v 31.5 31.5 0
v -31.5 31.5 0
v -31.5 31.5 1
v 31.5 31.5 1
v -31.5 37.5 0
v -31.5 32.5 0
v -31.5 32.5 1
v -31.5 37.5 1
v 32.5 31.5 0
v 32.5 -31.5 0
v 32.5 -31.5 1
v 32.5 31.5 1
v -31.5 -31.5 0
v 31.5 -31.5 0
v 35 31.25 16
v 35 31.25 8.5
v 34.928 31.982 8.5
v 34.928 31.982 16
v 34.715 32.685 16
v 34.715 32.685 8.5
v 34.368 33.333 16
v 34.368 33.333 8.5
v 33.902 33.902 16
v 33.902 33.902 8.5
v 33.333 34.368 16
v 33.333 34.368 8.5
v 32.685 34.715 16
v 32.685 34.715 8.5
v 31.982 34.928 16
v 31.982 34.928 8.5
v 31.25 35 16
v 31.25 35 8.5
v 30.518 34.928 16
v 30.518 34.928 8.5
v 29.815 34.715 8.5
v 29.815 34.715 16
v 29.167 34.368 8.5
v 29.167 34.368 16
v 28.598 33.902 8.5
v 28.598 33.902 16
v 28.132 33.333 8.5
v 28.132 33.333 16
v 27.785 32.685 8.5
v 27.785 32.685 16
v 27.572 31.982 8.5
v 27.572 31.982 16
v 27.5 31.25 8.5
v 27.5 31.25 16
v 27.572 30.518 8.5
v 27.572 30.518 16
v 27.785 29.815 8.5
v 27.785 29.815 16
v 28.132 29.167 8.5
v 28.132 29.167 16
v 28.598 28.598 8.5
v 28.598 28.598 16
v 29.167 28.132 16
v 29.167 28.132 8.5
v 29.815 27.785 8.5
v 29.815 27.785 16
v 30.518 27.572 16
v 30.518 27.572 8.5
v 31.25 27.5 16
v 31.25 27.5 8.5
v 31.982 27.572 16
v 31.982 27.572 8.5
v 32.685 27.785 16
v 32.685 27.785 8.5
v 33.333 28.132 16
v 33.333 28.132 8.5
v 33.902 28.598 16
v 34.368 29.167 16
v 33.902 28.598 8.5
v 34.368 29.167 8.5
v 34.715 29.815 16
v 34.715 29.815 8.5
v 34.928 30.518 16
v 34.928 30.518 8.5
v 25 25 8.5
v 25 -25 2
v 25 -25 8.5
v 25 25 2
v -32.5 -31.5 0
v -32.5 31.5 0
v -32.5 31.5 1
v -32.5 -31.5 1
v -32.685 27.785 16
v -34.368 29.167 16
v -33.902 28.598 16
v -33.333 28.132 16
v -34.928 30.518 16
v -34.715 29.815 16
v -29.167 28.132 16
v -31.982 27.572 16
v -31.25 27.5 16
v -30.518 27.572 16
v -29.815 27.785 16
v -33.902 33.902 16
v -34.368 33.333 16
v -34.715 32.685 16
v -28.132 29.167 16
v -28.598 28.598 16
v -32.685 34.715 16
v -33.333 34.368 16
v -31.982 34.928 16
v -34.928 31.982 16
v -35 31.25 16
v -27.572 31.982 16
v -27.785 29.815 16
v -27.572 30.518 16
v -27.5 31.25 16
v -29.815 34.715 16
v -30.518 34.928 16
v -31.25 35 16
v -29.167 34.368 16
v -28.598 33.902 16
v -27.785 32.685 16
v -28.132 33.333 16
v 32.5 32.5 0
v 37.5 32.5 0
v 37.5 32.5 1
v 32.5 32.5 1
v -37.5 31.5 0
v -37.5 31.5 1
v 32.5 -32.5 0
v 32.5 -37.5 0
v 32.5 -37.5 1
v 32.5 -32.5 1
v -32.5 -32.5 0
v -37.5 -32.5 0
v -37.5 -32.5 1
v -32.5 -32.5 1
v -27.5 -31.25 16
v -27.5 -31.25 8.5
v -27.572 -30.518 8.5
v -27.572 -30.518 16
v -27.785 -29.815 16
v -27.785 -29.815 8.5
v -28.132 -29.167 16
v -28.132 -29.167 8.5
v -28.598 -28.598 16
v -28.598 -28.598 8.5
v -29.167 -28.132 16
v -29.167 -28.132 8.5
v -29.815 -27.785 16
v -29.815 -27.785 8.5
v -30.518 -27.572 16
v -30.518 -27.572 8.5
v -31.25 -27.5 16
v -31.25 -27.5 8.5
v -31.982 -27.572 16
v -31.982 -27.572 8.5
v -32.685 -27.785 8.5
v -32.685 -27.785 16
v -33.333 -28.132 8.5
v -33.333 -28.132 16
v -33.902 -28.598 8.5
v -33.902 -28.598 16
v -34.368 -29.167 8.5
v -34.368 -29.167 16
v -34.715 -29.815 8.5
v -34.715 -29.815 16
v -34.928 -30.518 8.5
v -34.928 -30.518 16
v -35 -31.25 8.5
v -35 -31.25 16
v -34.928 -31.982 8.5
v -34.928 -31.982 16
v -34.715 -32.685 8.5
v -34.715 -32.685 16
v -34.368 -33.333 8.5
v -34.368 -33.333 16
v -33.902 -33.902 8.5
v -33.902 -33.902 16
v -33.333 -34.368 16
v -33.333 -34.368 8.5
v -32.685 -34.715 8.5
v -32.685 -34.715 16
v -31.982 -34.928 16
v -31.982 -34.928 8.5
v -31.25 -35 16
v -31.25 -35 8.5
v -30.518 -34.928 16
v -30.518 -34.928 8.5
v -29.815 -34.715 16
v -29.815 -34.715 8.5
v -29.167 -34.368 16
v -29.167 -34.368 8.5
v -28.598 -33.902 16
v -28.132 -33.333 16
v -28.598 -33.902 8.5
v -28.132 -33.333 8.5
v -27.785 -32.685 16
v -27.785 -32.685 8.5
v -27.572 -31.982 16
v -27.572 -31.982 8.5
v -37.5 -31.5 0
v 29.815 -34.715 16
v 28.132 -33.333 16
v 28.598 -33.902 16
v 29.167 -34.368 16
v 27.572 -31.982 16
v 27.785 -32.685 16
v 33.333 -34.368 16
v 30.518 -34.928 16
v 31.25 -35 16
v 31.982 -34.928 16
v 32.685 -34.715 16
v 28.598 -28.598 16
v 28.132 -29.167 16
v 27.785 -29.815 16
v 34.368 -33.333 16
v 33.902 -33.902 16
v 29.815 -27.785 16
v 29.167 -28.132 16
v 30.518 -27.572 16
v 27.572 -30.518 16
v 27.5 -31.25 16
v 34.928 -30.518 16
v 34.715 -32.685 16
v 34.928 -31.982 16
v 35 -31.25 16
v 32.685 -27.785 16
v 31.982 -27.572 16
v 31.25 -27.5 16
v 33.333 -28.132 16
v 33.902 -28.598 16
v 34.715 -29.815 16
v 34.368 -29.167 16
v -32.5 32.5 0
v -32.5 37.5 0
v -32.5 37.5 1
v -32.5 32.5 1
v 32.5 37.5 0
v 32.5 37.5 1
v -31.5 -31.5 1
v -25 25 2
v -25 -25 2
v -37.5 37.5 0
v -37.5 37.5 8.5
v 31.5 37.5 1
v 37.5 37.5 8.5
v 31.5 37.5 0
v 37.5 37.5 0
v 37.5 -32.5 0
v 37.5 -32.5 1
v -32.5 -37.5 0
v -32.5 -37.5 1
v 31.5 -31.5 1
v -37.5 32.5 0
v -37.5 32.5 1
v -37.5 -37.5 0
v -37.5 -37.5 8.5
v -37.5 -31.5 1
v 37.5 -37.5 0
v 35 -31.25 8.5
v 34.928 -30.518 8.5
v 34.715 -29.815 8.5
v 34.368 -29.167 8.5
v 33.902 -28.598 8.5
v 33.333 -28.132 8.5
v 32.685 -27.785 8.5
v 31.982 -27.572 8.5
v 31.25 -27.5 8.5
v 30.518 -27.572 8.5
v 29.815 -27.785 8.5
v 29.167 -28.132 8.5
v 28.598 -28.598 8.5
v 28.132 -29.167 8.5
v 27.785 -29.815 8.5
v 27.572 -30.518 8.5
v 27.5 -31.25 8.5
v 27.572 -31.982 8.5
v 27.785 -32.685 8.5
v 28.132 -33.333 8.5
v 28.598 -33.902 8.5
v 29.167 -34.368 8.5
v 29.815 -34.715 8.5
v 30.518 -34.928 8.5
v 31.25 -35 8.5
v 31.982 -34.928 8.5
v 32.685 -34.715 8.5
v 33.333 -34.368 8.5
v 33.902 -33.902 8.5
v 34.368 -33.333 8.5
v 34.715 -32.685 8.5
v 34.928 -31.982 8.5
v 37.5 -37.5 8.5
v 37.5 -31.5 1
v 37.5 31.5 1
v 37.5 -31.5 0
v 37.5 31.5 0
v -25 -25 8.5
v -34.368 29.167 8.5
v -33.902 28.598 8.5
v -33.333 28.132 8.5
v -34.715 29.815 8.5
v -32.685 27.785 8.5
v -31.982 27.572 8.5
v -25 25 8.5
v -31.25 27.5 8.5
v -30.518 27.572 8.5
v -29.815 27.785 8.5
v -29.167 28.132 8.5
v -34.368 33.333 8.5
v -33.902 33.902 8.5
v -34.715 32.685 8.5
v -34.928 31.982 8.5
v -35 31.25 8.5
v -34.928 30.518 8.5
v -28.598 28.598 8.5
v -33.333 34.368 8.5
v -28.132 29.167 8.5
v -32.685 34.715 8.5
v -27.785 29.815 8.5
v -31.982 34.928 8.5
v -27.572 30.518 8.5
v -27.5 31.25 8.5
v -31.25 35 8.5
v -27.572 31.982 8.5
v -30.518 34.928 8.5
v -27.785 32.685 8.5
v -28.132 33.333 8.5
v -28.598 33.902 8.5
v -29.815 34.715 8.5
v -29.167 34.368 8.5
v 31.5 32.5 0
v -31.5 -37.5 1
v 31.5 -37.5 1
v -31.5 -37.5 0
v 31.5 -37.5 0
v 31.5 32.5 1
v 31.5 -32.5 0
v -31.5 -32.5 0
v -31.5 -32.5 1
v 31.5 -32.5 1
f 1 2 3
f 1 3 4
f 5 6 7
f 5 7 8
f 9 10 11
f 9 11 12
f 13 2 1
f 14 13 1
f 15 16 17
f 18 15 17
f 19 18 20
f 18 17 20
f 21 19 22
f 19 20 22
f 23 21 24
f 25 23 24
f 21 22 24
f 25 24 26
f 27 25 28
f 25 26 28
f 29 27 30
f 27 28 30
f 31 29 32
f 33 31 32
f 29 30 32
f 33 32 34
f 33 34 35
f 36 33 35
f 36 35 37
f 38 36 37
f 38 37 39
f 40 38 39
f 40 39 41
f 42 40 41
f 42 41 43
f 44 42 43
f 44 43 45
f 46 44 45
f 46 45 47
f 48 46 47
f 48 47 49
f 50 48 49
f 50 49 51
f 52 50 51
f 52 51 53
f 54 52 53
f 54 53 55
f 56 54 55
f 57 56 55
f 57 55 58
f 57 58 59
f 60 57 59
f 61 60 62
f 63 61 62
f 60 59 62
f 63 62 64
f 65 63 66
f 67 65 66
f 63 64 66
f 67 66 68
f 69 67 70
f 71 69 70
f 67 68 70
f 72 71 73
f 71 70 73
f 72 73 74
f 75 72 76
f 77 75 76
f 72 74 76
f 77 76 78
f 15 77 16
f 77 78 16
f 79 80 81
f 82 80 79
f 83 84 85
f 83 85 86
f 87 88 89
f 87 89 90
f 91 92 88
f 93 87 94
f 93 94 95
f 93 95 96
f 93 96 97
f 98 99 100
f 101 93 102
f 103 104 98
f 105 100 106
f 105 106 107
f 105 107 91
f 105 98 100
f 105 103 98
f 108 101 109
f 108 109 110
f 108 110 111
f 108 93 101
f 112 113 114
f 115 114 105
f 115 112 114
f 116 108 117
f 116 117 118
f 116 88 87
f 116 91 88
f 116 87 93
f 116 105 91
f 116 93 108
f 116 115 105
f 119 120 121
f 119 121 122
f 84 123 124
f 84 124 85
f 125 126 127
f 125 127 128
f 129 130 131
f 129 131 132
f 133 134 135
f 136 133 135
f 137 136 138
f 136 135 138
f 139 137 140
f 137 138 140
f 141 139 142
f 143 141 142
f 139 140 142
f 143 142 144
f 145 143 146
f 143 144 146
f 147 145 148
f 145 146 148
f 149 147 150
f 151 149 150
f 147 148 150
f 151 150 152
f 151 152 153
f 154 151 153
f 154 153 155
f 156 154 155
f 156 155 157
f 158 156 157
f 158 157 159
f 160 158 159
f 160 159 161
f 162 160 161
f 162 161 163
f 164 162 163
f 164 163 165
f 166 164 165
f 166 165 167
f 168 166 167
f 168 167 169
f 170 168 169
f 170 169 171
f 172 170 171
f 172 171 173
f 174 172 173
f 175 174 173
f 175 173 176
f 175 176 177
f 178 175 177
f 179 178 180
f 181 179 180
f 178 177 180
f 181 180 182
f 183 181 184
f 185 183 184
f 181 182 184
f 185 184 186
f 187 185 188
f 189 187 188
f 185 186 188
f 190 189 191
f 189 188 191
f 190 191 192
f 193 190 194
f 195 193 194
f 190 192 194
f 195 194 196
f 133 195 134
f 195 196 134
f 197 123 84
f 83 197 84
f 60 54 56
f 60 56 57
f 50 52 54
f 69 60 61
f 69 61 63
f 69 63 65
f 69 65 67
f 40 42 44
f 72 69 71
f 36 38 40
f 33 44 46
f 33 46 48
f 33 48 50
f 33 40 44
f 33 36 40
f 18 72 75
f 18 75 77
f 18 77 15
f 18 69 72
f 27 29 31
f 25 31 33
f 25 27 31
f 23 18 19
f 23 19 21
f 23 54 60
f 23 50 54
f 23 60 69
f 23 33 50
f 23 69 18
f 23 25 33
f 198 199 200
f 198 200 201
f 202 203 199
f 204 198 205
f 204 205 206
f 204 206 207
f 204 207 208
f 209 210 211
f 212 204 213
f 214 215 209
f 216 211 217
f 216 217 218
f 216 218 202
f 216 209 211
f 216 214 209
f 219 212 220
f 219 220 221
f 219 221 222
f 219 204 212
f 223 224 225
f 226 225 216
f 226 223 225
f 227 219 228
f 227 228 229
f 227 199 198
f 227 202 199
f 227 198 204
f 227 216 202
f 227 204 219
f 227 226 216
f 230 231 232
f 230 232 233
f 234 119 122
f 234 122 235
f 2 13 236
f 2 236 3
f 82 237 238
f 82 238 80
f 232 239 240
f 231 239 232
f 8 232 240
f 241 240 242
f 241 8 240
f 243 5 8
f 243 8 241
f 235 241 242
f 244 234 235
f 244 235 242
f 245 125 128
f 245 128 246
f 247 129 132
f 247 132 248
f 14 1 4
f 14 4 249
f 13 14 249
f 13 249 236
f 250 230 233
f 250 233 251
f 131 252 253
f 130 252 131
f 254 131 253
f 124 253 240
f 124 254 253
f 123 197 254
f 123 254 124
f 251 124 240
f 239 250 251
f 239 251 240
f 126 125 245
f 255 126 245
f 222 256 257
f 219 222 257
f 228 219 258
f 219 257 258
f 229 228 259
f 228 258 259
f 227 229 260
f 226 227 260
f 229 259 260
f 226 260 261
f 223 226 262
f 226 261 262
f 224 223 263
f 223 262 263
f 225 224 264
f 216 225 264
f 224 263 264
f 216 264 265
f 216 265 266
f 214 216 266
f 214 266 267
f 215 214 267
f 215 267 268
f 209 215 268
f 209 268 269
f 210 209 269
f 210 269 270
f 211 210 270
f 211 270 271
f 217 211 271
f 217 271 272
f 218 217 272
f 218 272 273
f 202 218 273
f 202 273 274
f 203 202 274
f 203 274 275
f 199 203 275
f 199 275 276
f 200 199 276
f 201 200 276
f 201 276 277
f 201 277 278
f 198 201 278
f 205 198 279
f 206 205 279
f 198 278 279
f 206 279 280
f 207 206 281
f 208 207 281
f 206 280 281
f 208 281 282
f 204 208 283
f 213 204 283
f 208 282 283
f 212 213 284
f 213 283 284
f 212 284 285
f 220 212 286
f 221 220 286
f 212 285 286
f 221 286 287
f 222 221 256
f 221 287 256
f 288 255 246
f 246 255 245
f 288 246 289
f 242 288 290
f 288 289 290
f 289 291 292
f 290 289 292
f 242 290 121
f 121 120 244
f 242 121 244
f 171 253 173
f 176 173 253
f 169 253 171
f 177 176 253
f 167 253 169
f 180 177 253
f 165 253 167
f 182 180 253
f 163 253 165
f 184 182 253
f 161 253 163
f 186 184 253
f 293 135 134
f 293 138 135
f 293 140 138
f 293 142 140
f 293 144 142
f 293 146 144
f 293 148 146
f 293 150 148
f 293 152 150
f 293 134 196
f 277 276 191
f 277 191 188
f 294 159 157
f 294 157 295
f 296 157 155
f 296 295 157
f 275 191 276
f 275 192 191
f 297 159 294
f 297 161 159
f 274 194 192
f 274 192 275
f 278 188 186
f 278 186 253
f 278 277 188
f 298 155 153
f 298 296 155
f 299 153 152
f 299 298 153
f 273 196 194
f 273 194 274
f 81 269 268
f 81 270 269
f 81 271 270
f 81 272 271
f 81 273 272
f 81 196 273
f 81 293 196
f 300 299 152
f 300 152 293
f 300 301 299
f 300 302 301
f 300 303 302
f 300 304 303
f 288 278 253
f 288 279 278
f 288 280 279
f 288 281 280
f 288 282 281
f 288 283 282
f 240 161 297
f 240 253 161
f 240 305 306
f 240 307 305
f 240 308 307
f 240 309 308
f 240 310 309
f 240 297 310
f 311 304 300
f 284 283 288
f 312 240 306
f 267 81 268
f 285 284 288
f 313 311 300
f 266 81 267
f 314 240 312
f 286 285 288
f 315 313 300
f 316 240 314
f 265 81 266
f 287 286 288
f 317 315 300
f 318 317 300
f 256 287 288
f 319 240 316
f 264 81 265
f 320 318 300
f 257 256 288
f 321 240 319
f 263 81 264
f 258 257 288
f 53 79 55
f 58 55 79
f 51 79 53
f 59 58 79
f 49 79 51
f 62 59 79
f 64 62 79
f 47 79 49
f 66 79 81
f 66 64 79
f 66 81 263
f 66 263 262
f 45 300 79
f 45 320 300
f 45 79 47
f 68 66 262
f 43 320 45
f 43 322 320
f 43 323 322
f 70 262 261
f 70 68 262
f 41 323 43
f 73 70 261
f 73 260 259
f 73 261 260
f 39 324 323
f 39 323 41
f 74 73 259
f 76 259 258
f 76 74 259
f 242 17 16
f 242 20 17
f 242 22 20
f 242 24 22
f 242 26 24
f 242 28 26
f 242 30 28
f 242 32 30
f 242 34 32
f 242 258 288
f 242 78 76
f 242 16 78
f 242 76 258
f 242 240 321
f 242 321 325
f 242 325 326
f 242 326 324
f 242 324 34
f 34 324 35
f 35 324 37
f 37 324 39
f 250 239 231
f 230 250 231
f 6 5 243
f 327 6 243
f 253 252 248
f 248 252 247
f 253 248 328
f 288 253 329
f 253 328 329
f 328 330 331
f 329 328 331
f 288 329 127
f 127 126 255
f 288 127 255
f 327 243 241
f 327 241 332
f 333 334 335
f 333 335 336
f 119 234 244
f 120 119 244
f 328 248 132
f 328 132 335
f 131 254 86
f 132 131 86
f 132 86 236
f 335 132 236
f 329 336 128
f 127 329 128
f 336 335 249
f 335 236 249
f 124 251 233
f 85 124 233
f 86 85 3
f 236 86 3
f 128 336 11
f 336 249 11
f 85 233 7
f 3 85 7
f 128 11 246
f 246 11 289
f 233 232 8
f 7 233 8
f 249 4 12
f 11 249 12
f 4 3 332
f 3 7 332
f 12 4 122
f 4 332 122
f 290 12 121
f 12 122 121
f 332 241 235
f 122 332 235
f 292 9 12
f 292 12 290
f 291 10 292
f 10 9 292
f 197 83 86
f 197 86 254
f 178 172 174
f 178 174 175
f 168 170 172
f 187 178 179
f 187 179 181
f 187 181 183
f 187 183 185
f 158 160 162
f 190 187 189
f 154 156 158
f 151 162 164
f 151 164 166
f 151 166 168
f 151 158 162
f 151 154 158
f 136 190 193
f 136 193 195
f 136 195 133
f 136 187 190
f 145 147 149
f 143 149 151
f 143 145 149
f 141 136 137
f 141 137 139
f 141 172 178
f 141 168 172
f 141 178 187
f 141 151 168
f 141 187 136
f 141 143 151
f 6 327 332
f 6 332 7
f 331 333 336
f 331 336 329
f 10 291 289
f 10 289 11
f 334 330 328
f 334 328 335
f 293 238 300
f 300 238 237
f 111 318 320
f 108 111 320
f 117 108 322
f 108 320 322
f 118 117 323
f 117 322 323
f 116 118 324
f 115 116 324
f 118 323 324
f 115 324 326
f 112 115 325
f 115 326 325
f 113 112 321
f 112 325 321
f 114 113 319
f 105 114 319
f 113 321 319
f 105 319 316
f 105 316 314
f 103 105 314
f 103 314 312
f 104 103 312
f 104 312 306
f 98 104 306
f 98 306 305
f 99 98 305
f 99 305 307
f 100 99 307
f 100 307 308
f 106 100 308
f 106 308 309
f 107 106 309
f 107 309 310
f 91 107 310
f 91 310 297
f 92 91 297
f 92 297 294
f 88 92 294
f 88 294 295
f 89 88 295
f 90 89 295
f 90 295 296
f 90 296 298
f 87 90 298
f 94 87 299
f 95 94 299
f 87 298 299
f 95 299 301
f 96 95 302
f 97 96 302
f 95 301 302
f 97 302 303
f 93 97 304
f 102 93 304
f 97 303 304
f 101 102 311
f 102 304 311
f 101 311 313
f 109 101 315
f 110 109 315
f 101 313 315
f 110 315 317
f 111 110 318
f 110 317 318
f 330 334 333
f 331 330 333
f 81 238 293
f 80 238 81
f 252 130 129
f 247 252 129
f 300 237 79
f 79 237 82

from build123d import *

# Parameters (mm, degrees)
F0_W     = 75
F0_H     = 75
F0_R     = 3.75
F1_DEPTH = 2
F2_DEPTH = 16
F3_W     = 75
F3_H     = 75
F3_R     = 3.75
F3_W_2   = 50
F3_H_2   = 50
F4_DEPTH = 6.5
F5_W     = 1
F5_H     = 1
F6_DEPTH = 1


with BuildPart() as f1:
    # F0 (on Top) → F1 (new body)
    with BuildSketch(Plane.XY):
        Rectangle(F0_W, F0_H)
        with Locations((-31.25, -31.25)):
            Circle(F0_R, mode=Mode.SUBTRACT)
        with Locations((31.25, -31.25)):
            Circle(F0_R, mode=Mode.SUBTRACT)
        with Locations((-31.25, 31.25)):
            Circle(F0_R, mode=Mode.SUBTRACT)
        with Locations((31.25, 31.25)):
            Circle(F0_R, mode=Mode.SUBTRACT)
        with Locations((-31.25, 31.25)):
            Circle(F0_R)
        with Locations((31.25, 31.25)):
            Circle(F0_R)
        with Locations((31.25, -31.25)):
            Circle(F0_R)
        with Locations((-31.25, -31.25)):
            Circle(F0_R)
    extrude(amount=F1_DEPTH)

    # F0 (on Top) → F2 (join)
    with BuildSketch(Plane.XY):
        with Locations((-31.25, -31.25)):
            Circle(F0_R)
        with Locations((31.25, -31.25)):
            Circle(F0_R)
        with Locations((-31.25, 31.25)):
            Circle(F0_R)
        with Locations((31.25, 31.25)):
            Circle(F0_R)
    extrude(amount=F2_DEPTH)

    # F3 (on face) → F4 (join)
    with BuildSketch(Plane.XY.offset(2)):
        Rectangle(F3_W, F3_H)
        with Locations((-31.25, -31.25)):
            Circle(F3_R, mode=Mode.SUBTRACT)
        with Locations((31.25, -31.25)):
            Circle(F3_R, mode=Mode.SUBTRACT)
        with Locations((-31.25, 31.25)):
            Circle(F3_R, mode=Mode.SUBTRACT)
        Rectangle(F3_W_2, F3_H_2, mode=Mode.SUBTRACT)
        with Locations((31.25, 31.25)):
            Circle(F3_R, mode=Mode.SUBTRACT)
    extrude(amount=F4_DEPTH)

    # F5 (on face) → F6 (cut)
    with BuildSketch(Plane.XY):
        with BuildLine():
            Line((-32.5, -34.7855339059), (-32.5, -37.5))
            Line((-32.5, -37.5), (-31.5, -37.5))
            Line((-31.5, -37.5), (-31.5, -34.9916573868))
            ThreePointArc((-31.5, -34.9916573868), (-32.0070480317, -34.9227888964), (-32.5, -34.7855339059))
        make_face()
        with BuildLine():
            Line((-32.5, -32.5), (-32.5, -34.7855339059))
            ThreePointArc((-32.5, -34.7855339059), (-32.0070480317, -34.9227888964), (-31.5, -34.9916573868))
            Line((-31.5, -34.9916573868), (-31.5, -32.5))
            Line((-31.5, -32.5), (-32.5, -32.5))
        make_face()
        with BuildLine():
            Line((31.5, -34.9916573868), (31.5, -37.5))
            Line((31.5, -37.5), (32.5, -37.5))
            Line((32.5, -37.5), (32.5, -34.7855339059))
            ThreePointArc((32.5, -34.7855339059), (32.0070480317, -34.9227888964), (31.5, -34.9916573868))
        make_face()
        with BuildLine():
            Line((-34.7855339059, -32.5), (-32.5, -32.5))
            Line((-32.5, -32.5), (-32.5, -31.5))
            Line((-32.5, -31.5), (-34.9916573868, -31.5))
            ThreePointArc((-34.9916573868, -31.5), (-34.9227888964, -32.0070480317), (-34.7855339059, -32.5))
        make_face()
        with Locations((-32, -32)):
            Rectangle(F5_W, F5_H)
        with BuildLine():
            Line((-37.5, -32.5), (-34.7855339059, -32.5))
            ThreePointArc((-34.7855339059, -32.5), (-34.9227888964, -32.0070480317), (-34.9916573868, -31.5))
            Line((-34.9916573868, -31.5), (-37.5, -31.5))
            Line((-37.5, -31.5), (-37.5, -32.5))
        make_face()
        with BuildLine():
            Line((-31.5, -31.5), (-31.5, -32.5))
            Line((-31.5, -32.5), (-27.7144660941, -32.5))
            ThreePointArc((-27.7144660941, -32.5), (-27.5772111036, -32.0070480317), (-27.5083426132, -31.5))
            Line((-27.5083426132, -31.5), (-31.5, -31.5))
        make_face()
        with BuildLine():
            ThreePointArc((-27.5083426132, -31.5), (-27.5772111036, -32.0070480317), (-27.7144660941, -32.5))
            Line((-27.7144660941, -32.5), (27.7144660941, -32.5))
            ThreePointArc((27.7144660941, -32.5), (27.5772111036, -32.0070480317), (27.5083426132, -31.5))
            Line((27.5083426132, -31.5), (-27.5083426132, -31.5))
        make_face()
        with BuildLine():
            Line((31.5, -32.5), (31.5, -34.9916573868))
            ThreePointArc((31.5, -34.9916573868), (32.0070480317, -34.9227888964), (32.5, -34.7855339059))
            Line((32.5, -34.7855339059), (32.5, -32.5))
            Line((32.5, -32.5), (31.5, -32.5))
        make_face()
        with BuildLine():
            Line((-32.5, -27.7144660941), (-32.5, -31.5))
            Line((-32.5, -31.5), (-31.5, -31.5))
            Line((-31.5, -31.5), (-31.5, -27.5083426132))
            ThreePointArc((-31.5, -27.5083426132), (-32.0070480317, -27.5772111036), (-32.5, -27.7144660941))
        make_face()
        with BuildLine():
            ThreePointArc((27.5083426132, -31.5), (27.5772111036, -32.0070480317), (27.7144660941, -32.5))
            Line((27.7144660941, -32.5), (31.5, -32.5))
            Line((31.5, -32.5), (31.5, -31.5))
            Line((31.5, -31.5), (27.5083426132, -31.5))
        make_face()
        with Locations((32, -32)):
            Rectangle(F5_W, F5_H)
        with BuildLine():
            Line((-32.5, 27.7144660941), (-32.5, -27.7144660941))
            ThreePointArc((-32.5, -27.7144660941), (-32.0070480317, -27.5772111036), (-31.5, -27.5083426132))
            Line((-31.5, -27.5083426132), (-31.5, 27.5083426132))
            ThreePointArc((-31.5, 27.5083426132), (-32.0070480317, 27.5772111036), (-32.5, 27.7144660941))
        make_face()
        with BuildLine():
            Line((-37.5, 32.5), (-37.5, 31.5))
            Line((-37.5, 31.5), (-34.9916573868, 31.5))
            ThreePointArc((-34.9916573868, 31.5), (-34.9227888964, 32.0070480317), (-34.7855339059, 32.5))
            Line((-34.7855339059, 32.5), (-37.5, 32.5))
        make_face()
        with BuildLine():
            Line((32.5, -31.5), (32.5, -32.5))
            Line((32.5, -32.5), (34.7855339059, -32.5))
            ThreePointArc((34.7855339059, -32.5), (34.9227888964, -32.0070480317), (34.9916573868, -31.5))
            Line((34.9916573868, -31.5), (32.5, -31.5))
        make_face()
        with BuildLine():
            ThreePointArc((34.9916573868, -31.5), (34.9227888964, -32.0070480317), (34.7855339059, -32.5))
            Line((34.7855339059, -32.5), (37.5, -32.5))
            Line((37.5, -32.5), (37.5, -31.5))
            Line((37.5, -31.5), (34.9916573868, -31.5))
        make_face()
        with BuildLine():
            Line((31.5, -27.5083426132), (31.5, -31.5))
            Line((31.5, -31.5), (32.5, -31.5))
            Line((32.5, -31.5), (32.5, -27.7144660941))
            ThreePointArc((32.5, -27.7144660941), (32.0070480317, -27.5772111036), (31.5, -27.5083426132))
        make_face()
        with BuildLine():
            Line((-32.5, 31.5), (-32.5, 27.7144660941))
            ThreePointArc((-32.5, 27.7144660941), (-32.0070480317, 27.5772111036), (-31.5, 27.5083426132))
            Line((-31.5, 27.5083426132), (-31.5, 31.5))
            Line((-31.5, 31.5), (-32.5, 31.5))
        make_face()
        with BuildLine():
            ThreePointArc((-34.7855339059, 32.5), (-34.9227888964, 32.0070480317), (-34.9916573868, 31.5))
            Line((-34.9916573868, 31.5), (-32.5, 31.5))
            Line((-32.5, 31.5), (-32.5, 32.5))
            Line((-32.5, 32.5), (-34.7855339059, 32.5))
        make_face()
        with BuildLine():
            Line((31.5, 27.5083426132), (31.5, -27.5083426132))
            ThreePointArc((31.5, -27.5083426132), (32.0070480317, -27.5772111036), (32.5, -27.7144660941))
            Line((32.5, -27.7144660941), (32.5, 27.7144660941))
            ThreePointArc((32.5, 27.7144660941), (32.0070480317, 27.5772111036), (31.5, 27.5083426132))
        make_face()
        with Locations((-32, 32)):
            Rectangle(F5_W, F5_H)
        with BuildLine():
            Line((-31.5, 32.5), (-31.5, 31.5))
            Line((-31.5, 31.5), (-27.5083426132, 31.5))
            ThreePointArc((-27.5083426132, 31.5), (-27.5772111036, 32.0070480317), (-27.7144660941, 32.5))
            Line((-27.7144660941, 32.5), (-31.5, 32.5))
        make_face()
        with BuildLine():
            Line((31.5, 31.5), (31.5, 27.5083426132))
            ThreePointArc((31.5, 27.5083426132), (32.0070480317, 27.5772111036), (32.5, 27.7144660941))
            Line((32.5, 27.7144660941), (32.5, 31.5))
            Line((32.5, 31.5), (31.5, 31.5))
        make_face()
        with BuildLine():
            Line((34.9916573868, 31.5), (37.5, 31.5))
            Line((37.5, 31.5), (37.5, 32.5))
            Line((37.5, 32.5), (34.7855339059, 32.5))
            ThreePointArc((34.7855339059, 32.5), (34.9227888964, 32.0070480317), (34.9916573868, 31.5))
        make_face()
        with BuildLine():
            Line((-32.5, 34.7855339059), (-32.5, 32.5))
            Line((-32.5, 32.5), (-31.5, 32.5))
            Line((-31.5, 32.5), (-31.5, 34.9916573868))
            ThreePointArc((-31.5, 34.9916573868), (-32.0070480317, 34.9227888964), (-32.5, 34.7855339059))
        make_face()
        with BuildLine():
            Line((-32.5, 37.5), (-32.5, 34.7855339059))
            ThreePointArc((-32.5, 34.7855339059), (-32.0070480317, 34.9227888964), (-31.5, 34.9916573868))
            Line((-31.5, 34.9916573868), (-31.5, 37.5))
            Line((-31.5, 37.5), (-32.5, 37.5))
        make_face()
        with BuildLine():
            ThreePointArc((-27.7144660941, 32.5), (-27.5772111036, 32.0070480317), (-27.5083426132, 31.5))
            Line((-27.5083426132, 31.5), (27.5083426132, 31.5))
            ThreePointArc((27.5083426132, 31.5), (27.5772111036, 32.0070480317), (27.7144660941, 32.5))
            Line((27.7144660941, 32.5), (-27.7144660941, 32.5))
        make_face()
        with BuildLine():
            Line((27.5083426132, 31.5), (31.5, 31.5))
            Line((31.5, 31.5), (31.5, 32.5))
            Line((31.5, 32.5), (27.7144660941, 32.5))
            ThreePointArc((27.7144660941, 32.5), (27.5772111036, 32.0070480317), (27.5083426132, 31.5))
        make_face()
        with Locations((32, 32)):
            Rectangle(F5_W, F5_H)
        with BuildLine():
            Line((32.5, 31.5), (34.9916573868, 31.5))
            ThreePointArc((34.9916573868, 31.5), (34.9227888964, 32.0070480317), (34.7855339059, 32.5))
            Line((34.7855339059, 32.5), (32.5, 32.5))
            Line((32.5, 32.5), (32.5, 31.5))
        make_face()
        with BuildLine():
            Line((31.5, 34.9916573868), (31.5, 32.5))
            Line((31.5, 32.5), (32.5, 32.5))
            Line((32.5, 32.5), (32.5, 34.7855339059))
            ThreePointArc((32.5, 34.7855339059), (32.0070480317, 34.9227888964), (31.5, 34.9916573868))
        make_face()
        with BuildLine():
            Line((32.5, 37.5), (31.5, 37.5))
            Line((31.5, 37.5), (31.5, 34.9916573868))
            ThreePointArc((31.5, 34.9916573868), (32.0070480317, 34.9227888964), (32.5, 34.7855339059))
            Line((32.5, 34.7855339059), (32.5, 37.5))
        make_face()
    extrude(amount=F6_DEPTH, mode=Mode.SUBTRACT)


solid = f1.part
